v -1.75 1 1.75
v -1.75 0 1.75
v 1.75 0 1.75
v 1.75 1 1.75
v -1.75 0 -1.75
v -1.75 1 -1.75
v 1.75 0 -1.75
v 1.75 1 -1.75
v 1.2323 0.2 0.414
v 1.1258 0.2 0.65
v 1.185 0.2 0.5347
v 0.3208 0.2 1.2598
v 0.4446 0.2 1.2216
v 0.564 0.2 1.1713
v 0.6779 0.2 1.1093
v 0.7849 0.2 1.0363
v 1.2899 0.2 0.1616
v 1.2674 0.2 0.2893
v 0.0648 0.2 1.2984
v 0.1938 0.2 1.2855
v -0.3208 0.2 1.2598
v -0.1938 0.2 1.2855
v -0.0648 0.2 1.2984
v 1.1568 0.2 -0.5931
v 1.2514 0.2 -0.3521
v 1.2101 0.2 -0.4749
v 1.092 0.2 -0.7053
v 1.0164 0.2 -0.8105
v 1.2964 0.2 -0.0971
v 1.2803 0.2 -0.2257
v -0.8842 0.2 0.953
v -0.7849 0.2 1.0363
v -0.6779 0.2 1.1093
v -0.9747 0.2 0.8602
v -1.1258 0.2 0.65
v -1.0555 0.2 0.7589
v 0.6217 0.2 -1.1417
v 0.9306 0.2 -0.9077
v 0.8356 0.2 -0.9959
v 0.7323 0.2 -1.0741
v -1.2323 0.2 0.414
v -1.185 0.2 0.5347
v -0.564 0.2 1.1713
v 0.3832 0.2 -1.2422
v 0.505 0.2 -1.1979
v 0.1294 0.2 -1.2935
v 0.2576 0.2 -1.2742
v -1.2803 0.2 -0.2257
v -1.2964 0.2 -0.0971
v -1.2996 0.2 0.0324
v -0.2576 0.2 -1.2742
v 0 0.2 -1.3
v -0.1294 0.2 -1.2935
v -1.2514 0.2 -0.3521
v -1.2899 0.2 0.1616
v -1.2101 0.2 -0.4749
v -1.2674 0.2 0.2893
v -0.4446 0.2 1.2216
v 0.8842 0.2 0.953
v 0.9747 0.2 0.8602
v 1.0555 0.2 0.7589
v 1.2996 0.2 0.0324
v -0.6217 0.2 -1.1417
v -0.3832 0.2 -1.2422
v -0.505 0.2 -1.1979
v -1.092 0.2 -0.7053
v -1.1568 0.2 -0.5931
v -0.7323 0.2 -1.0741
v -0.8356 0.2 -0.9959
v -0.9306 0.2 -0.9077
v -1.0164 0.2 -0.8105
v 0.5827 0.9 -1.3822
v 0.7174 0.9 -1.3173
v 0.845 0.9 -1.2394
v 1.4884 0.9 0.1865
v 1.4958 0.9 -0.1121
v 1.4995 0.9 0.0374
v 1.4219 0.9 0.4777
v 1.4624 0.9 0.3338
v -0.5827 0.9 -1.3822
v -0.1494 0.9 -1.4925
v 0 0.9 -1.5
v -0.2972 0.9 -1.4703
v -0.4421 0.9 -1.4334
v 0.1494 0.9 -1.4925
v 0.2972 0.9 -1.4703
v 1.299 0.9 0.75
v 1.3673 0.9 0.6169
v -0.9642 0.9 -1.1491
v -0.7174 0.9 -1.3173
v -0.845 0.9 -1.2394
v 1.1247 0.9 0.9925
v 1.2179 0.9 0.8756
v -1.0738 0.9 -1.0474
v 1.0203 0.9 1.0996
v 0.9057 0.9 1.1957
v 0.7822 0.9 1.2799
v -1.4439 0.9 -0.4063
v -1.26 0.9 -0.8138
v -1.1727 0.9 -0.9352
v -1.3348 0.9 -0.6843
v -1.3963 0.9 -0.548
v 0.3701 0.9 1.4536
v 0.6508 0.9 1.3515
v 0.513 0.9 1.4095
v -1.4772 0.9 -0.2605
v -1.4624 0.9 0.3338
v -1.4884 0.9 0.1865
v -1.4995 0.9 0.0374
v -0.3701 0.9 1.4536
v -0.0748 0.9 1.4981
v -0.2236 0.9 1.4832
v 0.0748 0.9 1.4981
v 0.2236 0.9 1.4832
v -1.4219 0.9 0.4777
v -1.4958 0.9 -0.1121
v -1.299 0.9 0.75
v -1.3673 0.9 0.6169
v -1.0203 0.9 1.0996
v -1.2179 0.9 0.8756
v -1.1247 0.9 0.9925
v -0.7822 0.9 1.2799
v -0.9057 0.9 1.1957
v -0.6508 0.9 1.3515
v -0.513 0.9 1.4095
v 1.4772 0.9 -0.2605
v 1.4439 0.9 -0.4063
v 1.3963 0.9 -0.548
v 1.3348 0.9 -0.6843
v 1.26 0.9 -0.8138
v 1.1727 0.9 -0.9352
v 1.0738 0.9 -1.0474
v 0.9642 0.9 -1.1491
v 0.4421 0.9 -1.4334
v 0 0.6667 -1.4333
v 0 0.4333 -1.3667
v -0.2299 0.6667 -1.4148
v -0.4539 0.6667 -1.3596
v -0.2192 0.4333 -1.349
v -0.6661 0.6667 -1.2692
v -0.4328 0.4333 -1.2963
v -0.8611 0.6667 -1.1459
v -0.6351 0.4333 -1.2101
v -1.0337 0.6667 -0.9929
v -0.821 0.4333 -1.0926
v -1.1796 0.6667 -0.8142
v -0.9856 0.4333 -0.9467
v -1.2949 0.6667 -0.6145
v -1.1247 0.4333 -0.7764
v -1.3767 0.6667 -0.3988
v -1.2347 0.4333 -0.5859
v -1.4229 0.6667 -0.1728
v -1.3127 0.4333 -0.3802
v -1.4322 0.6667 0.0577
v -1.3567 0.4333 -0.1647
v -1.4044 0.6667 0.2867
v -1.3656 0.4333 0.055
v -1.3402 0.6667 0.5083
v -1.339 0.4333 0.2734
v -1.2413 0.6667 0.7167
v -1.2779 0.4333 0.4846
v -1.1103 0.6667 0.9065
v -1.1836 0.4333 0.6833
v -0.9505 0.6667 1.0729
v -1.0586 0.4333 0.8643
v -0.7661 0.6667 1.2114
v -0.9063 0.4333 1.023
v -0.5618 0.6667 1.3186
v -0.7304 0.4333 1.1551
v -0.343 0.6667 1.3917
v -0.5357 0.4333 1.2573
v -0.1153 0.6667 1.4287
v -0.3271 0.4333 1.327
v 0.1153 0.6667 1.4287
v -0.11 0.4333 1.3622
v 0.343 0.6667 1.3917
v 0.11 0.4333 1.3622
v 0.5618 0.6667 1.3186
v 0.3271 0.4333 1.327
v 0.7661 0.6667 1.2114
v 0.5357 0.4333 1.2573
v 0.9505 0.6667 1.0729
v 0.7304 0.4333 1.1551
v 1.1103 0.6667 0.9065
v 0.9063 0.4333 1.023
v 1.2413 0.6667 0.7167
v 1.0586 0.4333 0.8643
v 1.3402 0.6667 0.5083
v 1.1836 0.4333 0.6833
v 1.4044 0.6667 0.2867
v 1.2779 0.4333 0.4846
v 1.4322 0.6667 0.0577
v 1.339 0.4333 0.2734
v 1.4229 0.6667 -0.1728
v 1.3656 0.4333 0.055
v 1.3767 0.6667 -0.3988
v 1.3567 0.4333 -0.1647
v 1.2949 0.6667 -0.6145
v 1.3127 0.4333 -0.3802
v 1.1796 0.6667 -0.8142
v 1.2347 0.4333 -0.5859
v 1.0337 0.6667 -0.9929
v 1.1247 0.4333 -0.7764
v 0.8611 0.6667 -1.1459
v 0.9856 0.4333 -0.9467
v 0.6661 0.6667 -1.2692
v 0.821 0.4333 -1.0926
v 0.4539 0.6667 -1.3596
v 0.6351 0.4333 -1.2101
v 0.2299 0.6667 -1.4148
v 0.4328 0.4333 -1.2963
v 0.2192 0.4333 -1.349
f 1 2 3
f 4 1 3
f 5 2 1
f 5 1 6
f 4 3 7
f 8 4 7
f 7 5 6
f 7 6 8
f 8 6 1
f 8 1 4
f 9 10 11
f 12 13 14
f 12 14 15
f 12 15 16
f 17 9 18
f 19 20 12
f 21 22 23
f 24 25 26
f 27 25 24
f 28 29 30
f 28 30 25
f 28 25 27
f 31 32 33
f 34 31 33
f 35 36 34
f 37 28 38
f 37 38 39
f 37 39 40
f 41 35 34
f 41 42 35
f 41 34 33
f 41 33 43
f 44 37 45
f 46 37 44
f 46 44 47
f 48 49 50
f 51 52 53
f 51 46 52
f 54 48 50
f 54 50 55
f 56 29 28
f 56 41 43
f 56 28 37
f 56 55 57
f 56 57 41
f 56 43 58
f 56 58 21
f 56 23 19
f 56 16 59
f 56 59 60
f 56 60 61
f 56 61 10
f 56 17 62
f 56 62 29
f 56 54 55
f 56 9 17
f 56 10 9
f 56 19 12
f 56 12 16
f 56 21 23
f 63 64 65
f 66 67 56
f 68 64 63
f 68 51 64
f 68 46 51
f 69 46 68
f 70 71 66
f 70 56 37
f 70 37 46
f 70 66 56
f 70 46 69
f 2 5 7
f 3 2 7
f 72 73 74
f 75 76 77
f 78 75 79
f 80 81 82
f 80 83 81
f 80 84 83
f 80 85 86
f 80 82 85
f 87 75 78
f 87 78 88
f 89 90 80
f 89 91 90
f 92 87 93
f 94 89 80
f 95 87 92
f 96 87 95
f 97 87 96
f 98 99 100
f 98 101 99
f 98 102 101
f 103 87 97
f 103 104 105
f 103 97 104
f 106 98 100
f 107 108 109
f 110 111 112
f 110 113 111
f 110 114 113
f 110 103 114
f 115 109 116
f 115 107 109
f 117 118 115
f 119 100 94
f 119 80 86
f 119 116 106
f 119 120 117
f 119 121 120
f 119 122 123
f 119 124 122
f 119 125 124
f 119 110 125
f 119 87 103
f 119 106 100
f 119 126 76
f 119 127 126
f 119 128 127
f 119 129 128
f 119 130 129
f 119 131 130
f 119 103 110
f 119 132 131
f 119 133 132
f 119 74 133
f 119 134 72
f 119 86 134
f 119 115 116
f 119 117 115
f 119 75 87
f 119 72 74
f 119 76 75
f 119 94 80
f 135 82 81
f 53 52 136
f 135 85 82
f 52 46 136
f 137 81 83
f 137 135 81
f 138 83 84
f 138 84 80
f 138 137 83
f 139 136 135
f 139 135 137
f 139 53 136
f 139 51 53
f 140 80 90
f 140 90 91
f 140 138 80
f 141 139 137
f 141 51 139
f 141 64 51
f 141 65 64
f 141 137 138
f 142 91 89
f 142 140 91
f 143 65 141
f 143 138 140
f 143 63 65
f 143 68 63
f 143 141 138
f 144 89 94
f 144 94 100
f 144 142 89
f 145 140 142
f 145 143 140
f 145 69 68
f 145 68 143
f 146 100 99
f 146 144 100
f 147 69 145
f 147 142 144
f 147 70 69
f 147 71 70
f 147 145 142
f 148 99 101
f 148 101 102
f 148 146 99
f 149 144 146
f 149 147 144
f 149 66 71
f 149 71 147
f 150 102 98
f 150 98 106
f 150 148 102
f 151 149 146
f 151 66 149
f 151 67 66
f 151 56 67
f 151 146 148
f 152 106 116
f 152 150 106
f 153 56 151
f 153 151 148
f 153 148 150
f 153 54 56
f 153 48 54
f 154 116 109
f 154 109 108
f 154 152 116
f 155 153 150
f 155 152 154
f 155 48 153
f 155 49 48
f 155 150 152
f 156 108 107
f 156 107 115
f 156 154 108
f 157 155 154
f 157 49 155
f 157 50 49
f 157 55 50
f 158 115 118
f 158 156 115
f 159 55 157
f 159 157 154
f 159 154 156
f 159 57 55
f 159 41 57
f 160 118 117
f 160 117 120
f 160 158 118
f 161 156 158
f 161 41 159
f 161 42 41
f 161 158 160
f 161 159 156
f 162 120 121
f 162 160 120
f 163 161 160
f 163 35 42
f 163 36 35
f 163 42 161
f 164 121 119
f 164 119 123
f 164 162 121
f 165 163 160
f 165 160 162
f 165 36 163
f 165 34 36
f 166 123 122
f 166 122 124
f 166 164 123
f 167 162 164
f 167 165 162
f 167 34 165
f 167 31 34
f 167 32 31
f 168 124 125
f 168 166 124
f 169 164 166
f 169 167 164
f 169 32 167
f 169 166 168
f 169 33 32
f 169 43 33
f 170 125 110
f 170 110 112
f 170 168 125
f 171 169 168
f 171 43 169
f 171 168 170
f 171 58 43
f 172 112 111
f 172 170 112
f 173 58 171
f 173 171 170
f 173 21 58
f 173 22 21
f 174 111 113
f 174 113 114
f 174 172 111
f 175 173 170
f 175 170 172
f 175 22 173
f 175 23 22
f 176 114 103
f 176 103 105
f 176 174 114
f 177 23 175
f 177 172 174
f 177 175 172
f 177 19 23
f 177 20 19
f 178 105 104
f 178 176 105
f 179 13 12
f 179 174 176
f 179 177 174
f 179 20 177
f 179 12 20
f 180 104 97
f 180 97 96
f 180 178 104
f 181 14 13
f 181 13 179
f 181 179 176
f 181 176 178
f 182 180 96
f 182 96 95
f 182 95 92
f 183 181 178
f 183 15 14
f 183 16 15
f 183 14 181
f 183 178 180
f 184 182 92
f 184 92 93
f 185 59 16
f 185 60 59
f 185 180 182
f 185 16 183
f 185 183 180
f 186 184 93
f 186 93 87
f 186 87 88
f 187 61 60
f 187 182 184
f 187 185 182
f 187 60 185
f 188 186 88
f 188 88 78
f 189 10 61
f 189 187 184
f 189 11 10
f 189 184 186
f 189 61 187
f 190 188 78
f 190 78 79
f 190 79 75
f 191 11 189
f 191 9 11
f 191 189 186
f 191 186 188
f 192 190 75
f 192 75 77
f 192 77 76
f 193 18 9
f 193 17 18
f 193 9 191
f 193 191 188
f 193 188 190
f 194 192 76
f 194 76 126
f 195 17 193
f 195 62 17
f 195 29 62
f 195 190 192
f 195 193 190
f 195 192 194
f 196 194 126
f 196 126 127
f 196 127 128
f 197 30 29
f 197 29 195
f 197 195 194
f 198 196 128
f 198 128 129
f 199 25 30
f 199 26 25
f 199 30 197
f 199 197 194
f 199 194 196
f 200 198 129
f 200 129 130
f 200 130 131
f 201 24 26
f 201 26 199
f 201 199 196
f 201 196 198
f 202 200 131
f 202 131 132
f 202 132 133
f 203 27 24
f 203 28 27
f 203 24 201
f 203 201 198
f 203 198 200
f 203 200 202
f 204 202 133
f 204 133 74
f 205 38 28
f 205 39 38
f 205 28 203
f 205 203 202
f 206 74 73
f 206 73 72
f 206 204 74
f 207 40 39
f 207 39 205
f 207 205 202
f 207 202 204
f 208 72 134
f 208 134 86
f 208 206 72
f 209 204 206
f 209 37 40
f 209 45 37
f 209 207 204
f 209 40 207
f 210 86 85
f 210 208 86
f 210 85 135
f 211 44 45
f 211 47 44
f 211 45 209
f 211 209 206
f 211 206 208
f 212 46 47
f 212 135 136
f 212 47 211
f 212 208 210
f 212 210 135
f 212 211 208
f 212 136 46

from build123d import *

# Parameters (mm, degrees)
PROFILES_W    = 3.5
PROFILES_H    = 3.5
PROFILE_DEPTH = 1


with BuildPart() as part:
    # ProfileS → Profile (new body)
    with BuildSketch(Plane(origin=(0, 0, 0), x_dir=(1, 0, 0), z_dir=(0, 1, 0))):
        Rectangle(PROFILES_W, PROFILES_H)
    extrude(amount=PROFILE_DEPTH)

    # Sketch1 → Cut-Revolve1 (revolve, cut)
    with BuildSketch(Plane(origin=(0, 0, 0), x_dir=(0, 0, -1), z_dir=(1, 0, 0))):
        Polygon((0, 0.9), (1.5, 0.9), (1.3, 0.2), (0, 0.2), align=None)
    revolve(axis=Axis((0, 0, 0), (0, 1, 0)), mode=Mode.SUBTRACT)


solid = part.part
